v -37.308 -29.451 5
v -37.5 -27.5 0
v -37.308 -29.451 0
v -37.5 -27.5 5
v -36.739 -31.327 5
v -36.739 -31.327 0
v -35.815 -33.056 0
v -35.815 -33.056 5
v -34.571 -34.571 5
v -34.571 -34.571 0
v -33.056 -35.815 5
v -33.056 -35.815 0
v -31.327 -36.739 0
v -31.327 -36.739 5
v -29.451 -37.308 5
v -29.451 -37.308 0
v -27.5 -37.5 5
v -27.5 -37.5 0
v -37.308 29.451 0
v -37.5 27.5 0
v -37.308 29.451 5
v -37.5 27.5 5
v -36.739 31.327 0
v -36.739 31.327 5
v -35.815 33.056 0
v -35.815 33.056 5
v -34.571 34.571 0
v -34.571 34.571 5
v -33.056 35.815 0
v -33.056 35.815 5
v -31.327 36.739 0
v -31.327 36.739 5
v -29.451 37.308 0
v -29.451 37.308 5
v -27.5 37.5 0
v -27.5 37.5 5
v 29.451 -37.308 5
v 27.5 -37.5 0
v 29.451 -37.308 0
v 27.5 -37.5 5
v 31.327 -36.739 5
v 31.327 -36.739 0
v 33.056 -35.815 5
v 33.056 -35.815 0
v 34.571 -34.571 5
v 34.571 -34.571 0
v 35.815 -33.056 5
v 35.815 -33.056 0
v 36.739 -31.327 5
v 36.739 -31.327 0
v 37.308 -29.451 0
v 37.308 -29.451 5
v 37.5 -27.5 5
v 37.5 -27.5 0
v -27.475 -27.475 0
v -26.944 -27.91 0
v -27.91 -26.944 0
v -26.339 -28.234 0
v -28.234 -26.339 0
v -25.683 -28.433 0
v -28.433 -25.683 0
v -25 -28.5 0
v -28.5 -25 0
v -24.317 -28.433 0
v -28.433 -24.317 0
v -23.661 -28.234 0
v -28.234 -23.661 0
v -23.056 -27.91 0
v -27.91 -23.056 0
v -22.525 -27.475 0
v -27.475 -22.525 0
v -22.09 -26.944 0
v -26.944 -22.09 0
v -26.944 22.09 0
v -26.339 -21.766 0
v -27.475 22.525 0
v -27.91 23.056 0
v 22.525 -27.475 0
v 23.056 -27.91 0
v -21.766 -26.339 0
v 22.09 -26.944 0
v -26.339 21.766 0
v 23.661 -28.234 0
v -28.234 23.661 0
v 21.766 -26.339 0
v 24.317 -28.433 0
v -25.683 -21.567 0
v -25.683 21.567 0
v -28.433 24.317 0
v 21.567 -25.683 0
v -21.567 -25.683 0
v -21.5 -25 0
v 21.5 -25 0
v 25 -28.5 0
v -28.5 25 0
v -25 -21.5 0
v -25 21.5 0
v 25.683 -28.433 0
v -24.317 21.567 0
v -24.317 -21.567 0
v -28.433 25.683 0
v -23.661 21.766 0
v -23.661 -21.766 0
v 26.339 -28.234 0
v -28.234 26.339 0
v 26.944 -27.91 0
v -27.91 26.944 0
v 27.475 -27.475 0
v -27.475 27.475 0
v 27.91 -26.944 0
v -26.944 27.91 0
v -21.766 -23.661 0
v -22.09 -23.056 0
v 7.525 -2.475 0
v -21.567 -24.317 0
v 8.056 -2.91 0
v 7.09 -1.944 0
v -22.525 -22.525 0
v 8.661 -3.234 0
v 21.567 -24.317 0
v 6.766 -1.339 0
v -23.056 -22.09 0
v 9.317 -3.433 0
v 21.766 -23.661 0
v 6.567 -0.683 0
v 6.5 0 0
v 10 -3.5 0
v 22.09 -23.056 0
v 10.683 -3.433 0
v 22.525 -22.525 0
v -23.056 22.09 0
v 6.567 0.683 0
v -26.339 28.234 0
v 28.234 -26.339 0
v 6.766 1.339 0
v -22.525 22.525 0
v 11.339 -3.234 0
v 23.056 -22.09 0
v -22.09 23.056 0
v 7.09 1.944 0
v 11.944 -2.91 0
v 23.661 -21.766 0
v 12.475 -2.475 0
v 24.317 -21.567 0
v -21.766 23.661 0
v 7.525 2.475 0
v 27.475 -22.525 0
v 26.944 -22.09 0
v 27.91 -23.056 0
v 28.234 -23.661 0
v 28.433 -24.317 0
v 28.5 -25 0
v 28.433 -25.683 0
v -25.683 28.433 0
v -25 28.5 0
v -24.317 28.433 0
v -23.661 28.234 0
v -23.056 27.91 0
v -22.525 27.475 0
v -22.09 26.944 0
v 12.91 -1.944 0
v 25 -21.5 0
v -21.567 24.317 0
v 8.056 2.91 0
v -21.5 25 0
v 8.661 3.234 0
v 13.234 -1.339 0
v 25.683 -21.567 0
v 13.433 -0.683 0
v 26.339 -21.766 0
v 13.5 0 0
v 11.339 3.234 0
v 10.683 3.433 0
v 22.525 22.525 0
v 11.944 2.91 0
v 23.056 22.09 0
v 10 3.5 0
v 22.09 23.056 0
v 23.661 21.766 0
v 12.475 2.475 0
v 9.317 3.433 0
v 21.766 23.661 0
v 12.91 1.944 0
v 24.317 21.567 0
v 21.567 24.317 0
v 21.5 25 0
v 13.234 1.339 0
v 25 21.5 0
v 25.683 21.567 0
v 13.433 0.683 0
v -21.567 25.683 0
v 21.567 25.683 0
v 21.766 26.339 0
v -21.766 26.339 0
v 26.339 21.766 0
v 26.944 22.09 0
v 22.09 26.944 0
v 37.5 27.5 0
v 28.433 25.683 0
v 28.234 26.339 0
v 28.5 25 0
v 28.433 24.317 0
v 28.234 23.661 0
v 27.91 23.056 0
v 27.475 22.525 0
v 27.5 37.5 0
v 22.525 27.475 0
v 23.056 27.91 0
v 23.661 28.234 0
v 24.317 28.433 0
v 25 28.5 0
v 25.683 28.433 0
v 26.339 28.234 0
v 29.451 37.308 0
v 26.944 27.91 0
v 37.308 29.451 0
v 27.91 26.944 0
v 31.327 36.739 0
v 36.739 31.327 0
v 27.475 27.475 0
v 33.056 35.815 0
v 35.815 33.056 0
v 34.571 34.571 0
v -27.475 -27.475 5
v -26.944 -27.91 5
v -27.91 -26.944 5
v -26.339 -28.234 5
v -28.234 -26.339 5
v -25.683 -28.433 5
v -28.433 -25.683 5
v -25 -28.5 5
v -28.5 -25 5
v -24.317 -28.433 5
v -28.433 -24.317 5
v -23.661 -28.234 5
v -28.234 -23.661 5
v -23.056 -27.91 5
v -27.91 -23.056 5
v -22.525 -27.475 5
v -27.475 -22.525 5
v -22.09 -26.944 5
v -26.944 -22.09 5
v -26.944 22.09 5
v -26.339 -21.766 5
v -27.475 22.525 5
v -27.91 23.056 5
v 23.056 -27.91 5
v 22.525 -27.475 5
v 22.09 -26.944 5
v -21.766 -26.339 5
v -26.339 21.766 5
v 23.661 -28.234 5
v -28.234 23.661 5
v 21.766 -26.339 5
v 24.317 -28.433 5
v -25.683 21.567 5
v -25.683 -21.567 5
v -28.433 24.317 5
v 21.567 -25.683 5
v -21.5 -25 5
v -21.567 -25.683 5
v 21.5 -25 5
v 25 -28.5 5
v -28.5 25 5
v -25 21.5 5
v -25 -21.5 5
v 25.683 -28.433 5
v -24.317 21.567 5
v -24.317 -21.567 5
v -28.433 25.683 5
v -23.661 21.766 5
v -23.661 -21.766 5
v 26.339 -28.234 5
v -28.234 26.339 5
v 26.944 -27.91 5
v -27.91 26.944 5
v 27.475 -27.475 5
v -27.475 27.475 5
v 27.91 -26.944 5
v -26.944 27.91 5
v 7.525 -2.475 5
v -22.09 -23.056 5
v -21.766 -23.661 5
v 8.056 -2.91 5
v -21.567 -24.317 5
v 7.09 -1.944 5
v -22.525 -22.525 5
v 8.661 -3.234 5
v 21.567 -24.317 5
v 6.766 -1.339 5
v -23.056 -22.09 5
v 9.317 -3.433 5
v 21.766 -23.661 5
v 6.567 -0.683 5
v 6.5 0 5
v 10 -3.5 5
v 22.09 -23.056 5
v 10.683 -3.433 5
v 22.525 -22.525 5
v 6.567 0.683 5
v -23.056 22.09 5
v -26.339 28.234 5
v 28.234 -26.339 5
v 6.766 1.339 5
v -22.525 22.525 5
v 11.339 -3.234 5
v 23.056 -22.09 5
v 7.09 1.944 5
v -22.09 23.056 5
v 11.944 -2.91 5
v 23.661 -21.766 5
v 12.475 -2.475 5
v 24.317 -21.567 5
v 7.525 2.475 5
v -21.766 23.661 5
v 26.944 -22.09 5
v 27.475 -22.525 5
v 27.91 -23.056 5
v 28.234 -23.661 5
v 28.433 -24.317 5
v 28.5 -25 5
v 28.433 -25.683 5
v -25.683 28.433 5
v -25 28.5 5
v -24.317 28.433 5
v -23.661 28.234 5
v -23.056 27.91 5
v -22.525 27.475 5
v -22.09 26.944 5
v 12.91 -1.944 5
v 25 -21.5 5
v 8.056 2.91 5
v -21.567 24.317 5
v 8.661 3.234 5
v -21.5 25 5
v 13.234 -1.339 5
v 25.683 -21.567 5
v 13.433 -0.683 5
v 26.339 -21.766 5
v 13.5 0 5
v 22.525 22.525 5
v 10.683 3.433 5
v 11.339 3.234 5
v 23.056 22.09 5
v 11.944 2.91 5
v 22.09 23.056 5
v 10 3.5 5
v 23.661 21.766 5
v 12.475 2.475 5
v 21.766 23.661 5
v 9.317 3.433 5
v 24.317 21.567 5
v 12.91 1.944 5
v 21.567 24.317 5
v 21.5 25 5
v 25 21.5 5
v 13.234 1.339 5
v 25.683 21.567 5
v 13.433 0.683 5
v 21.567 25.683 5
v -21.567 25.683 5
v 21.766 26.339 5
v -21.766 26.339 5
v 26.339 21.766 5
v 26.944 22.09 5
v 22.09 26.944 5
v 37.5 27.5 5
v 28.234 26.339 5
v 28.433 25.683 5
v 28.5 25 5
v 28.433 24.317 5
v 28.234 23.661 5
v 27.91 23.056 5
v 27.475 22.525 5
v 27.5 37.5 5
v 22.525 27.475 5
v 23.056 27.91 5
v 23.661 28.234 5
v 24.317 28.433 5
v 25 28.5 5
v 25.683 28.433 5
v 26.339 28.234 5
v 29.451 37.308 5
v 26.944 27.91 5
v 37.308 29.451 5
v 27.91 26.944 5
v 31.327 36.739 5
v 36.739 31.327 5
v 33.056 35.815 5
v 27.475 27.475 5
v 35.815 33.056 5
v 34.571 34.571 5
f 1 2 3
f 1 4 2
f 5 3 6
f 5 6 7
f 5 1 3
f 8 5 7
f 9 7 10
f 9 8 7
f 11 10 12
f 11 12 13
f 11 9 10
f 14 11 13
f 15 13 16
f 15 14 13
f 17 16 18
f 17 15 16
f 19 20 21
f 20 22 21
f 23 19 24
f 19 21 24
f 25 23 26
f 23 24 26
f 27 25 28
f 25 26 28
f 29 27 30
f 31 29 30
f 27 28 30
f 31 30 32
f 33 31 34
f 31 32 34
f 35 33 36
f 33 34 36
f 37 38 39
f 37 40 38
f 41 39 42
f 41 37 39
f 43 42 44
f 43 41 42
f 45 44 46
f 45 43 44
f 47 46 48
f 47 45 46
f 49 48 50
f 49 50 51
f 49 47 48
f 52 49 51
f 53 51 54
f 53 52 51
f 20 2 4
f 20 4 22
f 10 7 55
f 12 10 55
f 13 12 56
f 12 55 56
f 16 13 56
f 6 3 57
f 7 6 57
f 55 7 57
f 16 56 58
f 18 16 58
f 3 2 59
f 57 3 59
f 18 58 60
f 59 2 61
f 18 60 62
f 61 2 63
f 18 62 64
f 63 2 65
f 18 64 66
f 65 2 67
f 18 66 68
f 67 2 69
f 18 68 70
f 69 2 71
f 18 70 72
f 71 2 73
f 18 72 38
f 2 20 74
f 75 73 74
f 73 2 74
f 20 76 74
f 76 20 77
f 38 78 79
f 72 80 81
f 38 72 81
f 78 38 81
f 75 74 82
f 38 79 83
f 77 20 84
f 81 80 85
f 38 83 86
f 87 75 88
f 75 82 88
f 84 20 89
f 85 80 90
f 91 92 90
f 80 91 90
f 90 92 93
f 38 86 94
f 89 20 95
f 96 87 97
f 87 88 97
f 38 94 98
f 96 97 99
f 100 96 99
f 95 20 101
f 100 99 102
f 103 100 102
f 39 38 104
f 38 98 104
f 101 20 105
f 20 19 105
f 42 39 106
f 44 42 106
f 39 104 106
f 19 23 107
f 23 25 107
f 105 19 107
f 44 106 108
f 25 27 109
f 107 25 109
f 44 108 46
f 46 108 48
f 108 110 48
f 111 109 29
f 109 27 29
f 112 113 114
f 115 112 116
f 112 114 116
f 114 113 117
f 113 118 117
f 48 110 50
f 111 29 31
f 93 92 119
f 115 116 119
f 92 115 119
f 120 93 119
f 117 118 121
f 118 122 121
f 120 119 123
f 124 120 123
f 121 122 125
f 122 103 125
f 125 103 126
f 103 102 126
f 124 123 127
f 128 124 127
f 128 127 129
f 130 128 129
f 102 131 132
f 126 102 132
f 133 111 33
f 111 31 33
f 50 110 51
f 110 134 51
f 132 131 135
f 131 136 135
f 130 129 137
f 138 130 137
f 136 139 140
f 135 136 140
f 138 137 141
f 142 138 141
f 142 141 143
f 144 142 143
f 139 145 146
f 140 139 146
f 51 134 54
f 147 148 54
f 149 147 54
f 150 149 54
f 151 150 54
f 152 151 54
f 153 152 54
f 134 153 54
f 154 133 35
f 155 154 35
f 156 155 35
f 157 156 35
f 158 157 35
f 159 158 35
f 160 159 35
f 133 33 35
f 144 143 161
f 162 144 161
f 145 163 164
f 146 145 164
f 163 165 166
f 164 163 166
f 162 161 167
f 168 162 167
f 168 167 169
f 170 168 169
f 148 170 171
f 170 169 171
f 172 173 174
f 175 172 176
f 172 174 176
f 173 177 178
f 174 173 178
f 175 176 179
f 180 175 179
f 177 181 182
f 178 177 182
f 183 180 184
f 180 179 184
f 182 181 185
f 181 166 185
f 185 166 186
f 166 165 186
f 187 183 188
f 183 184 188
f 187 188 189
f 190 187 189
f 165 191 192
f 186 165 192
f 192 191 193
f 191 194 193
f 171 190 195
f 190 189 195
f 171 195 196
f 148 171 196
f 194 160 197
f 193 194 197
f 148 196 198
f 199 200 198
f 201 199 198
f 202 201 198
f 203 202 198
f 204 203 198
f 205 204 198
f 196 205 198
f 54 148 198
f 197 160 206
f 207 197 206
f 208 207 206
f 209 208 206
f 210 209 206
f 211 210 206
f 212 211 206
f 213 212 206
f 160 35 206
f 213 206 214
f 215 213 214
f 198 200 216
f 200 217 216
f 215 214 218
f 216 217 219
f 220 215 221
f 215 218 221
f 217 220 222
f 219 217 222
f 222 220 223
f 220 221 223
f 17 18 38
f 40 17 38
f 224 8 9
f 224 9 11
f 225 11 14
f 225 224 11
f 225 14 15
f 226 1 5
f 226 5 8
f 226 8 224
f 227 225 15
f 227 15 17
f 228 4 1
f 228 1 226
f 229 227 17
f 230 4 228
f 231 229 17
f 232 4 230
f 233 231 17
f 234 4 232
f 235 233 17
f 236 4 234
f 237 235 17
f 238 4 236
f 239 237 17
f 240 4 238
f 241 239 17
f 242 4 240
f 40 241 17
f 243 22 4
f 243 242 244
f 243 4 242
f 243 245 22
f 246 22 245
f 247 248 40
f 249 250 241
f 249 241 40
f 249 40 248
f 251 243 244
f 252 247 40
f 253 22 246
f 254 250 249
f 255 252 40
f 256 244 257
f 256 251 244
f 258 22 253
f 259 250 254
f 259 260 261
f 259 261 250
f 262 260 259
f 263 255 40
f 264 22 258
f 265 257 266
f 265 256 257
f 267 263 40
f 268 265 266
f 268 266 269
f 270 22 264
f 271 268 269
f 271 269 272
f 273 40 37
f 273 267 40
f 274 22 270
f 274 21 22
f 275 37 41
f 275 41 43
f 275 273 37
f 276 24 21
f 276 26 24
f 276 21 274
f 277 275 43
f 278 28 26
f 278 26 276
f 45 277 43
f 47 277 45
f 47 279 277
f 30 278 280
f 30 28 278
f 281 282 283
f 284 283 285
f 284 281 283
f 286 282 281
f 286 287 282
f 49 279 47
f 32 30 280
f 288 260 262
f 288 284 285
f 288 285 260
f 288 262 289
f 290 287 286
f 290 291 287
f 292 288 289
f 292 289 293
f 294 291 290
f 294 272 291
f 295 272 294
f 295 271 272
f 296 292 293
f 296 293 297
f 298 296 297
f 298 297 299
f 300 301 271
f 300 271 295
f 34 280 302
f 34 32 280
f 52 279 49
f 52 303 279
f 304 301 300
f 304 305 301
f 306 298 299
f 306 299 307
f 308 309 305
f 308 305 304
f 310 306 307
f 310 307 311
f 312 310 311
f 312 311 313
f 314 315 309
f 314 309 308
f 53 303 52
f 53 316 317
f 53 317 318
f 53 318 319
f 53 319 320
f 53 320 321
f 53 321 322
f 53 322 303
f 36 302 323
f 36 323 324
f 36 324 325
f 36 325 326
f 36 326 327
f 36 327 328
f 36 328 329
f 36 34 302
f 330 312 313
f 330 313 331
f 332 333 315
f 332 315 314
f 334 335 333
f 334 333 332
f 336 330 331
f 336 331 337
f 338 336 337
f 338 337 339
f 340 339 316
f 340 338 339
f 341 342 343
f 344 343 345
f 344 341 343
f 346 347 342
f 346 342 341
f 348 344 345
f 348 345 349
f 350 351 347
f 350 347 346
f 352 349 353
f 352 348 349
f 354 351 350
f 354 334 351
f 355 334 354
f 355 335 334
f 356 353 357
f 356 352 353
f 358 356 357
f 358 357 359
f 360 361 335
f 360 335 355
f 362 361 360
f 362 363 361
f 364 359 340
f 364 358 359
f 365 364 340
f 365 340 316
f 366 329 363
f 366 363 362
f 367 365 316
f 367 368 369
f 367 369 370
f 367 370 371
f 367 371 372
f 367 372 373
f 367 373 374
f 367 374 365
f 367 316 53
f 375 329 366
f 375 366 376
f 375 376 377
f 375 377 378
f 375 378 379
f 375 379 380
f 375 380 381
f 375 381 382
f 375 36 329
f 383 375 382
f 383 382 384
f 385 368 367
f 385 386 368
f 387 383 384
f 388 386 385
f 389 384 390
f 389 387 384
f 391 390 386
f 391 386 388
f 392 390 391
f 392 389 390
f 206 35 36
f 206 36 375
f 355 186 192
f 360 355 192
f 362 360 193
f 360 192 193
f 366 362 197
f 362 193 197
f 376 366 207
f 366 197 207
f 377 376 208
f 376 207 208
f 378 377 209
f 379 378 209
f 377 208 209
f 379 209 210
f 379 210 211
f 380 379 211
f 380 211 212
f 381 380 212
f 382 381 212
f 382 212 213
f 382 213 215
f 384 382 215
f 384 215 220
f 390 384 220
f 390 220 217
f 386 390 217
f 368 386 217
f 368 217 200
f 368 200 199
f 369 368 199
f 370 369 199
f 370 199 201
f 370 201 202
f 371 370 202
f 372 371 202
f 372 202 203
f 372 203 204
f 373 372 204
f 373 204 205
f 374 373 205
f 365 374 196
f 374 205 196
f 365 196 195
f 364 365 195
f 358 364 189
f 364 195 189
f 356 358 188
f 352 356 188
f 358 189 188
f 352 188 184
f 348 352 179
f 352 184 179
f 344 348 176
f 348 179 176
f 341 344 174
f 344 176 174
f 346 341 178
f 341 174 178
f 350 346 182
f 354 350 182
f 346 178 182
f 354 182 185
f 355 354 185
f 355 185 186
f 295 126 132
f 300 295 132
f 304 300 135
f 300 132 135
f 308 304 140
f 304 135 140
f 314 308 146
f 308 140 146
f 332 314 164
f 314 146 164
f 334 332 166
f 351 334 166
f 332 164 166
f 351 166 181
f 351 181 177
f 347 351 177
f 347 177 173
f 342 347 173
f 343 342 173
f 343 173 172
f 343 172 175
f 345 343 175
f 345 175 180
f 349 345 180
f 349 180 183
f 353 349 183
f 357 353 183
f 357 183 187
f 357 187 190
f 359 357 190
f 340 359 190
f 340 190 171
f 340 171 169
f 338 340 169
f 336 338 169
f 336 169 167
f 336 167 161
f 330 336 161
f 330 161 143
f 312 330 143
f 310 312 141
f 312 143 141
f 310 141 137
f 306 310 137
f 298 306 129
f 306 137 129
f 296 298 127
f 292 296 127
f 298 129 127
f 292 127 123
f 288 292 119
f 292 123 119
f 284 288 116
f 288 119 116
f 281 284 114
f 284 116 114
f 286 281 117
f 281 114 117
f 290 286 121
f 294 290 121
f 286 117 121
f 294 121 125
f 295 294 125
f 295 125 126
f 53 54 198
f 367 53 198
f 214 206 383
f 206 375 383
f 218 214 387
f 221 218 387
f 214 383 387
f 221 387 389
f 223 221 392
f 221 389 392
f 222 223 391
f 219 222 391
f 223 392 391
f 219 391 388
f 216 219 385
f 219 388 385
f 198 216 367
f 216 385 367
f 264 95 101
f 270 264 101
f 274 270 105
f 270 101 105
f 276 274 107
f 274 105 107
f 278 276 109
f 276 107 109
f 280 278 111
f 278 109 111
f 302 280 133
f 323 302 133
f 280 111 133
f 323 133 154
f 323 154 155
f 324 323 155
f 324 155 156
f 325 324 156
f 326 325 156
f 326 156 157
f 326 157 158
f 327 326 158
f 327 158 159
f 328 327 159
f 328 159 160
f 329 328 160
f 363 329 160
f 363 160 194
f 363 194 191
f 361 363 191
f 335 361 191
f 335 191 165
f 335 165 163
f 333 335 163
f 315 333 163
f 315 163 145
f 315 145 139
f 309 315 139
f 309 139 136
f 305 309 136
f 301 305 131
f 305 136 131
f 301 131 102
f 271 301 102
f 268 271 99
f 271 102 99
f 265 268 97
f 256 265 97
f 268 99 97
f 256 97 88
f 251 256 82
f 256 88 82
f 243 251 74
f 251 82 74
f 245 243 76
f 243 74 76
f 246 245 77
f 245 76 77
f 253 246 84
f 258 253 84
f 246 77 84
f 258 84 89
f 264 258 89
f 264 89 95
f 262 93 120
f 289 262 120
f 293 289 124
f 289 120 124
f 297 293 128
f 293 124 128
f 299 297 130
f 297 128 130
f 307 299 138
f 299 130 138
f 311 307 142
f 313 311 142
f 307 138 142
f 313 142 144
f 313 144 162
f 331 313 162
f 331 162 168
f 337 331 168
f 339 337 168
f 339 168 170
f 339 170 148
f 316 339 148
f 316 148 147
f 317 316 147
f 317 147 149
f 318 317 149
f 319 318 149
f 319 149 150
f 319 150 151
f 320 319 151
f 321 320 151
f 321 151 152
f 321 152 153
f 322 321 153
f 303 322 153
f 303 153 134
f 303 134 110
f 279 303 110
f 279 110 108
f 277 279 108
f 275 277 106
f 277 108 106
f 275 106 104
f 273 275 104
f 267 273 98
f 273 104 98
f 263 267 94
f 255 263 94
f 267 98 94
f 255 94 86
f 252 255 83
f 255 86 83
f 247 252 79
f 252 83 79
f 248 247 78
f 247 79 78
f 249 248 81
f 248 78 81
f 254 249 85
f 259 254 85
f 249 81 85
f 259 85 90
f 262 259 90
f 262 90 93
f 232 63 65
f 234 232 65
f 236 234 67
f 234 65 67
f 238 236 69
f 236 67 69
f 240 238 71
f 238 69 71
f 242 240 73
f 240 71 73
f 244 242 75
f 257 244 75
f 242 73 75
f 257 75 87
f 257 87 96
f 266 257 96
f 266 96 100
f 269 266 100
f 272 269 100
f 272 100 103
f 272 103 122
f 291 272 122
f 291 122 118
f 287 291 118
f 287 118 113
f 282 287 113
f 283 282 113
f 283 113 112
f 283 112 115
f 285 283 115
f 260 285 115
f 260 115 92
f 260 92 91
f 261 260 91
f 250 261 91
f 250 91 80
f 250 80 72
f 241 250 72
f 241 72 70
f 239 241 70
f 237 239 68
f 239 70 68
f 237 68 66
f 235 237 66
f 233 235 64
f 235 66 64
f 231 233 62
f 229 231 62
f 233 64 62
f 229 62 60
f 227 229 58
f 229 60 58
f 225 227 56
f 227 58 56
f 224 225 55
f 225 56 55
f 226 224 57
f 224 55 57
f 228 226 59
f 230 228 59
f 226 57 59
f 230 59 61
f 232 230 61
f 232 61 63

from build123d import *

# Parameters (mm, degrees)
SKETCH1_W                = 75
SKETCH1_H                = 75
BOSS_EXTRUDE1_DEPTH      = 5
F_7_0_7_DIAMETER_HOLE2_D = 7
FILLET1_R                = 10
F_7_0_7_DIAMETER_HOLE1_D = 7


with BuildPart() as part:
    # Sketch1 → Boss-Extrude1 (new body)
    with BuildSketch(Plane.XY):
        Rectangle(SKETCH1_W, SKETCH1_H)
    extrude(amount=BOSS_EXTRUDE1_DEPTH)

    # Ø7.0 (7) Diameter Hole2 (through all)
    with Locations(Plane.XY.offset(5)):
        with Locations((-25, 25), (-25, -25), (25, -25), (25, 25)):
            Hole(F_7_0_7_DIAMETER_HOLE2_D / 2)

    # Fillet1
    fillet1_edges = [part.edges().sort_by_distance(p)[0] for p in [
        (-37.5, 37.5, 2.5),
        (37.5, 37.5, 2.5),
        (37.5, -37.5, 2.5),
        (-37.5, -37.5, 2.5),
    ]]
    fillet(fillet1_edges, radius=FILLET1_R)

    # Ø7.0 (7) Diameter Hole1 (through all)
    with Locations(Plane.XY.offset(5)):
        with Locations((10, 0)):
            Hole(F_7_0_7_DIAMETER_HOLE1_D / 2)


solid = part.part
